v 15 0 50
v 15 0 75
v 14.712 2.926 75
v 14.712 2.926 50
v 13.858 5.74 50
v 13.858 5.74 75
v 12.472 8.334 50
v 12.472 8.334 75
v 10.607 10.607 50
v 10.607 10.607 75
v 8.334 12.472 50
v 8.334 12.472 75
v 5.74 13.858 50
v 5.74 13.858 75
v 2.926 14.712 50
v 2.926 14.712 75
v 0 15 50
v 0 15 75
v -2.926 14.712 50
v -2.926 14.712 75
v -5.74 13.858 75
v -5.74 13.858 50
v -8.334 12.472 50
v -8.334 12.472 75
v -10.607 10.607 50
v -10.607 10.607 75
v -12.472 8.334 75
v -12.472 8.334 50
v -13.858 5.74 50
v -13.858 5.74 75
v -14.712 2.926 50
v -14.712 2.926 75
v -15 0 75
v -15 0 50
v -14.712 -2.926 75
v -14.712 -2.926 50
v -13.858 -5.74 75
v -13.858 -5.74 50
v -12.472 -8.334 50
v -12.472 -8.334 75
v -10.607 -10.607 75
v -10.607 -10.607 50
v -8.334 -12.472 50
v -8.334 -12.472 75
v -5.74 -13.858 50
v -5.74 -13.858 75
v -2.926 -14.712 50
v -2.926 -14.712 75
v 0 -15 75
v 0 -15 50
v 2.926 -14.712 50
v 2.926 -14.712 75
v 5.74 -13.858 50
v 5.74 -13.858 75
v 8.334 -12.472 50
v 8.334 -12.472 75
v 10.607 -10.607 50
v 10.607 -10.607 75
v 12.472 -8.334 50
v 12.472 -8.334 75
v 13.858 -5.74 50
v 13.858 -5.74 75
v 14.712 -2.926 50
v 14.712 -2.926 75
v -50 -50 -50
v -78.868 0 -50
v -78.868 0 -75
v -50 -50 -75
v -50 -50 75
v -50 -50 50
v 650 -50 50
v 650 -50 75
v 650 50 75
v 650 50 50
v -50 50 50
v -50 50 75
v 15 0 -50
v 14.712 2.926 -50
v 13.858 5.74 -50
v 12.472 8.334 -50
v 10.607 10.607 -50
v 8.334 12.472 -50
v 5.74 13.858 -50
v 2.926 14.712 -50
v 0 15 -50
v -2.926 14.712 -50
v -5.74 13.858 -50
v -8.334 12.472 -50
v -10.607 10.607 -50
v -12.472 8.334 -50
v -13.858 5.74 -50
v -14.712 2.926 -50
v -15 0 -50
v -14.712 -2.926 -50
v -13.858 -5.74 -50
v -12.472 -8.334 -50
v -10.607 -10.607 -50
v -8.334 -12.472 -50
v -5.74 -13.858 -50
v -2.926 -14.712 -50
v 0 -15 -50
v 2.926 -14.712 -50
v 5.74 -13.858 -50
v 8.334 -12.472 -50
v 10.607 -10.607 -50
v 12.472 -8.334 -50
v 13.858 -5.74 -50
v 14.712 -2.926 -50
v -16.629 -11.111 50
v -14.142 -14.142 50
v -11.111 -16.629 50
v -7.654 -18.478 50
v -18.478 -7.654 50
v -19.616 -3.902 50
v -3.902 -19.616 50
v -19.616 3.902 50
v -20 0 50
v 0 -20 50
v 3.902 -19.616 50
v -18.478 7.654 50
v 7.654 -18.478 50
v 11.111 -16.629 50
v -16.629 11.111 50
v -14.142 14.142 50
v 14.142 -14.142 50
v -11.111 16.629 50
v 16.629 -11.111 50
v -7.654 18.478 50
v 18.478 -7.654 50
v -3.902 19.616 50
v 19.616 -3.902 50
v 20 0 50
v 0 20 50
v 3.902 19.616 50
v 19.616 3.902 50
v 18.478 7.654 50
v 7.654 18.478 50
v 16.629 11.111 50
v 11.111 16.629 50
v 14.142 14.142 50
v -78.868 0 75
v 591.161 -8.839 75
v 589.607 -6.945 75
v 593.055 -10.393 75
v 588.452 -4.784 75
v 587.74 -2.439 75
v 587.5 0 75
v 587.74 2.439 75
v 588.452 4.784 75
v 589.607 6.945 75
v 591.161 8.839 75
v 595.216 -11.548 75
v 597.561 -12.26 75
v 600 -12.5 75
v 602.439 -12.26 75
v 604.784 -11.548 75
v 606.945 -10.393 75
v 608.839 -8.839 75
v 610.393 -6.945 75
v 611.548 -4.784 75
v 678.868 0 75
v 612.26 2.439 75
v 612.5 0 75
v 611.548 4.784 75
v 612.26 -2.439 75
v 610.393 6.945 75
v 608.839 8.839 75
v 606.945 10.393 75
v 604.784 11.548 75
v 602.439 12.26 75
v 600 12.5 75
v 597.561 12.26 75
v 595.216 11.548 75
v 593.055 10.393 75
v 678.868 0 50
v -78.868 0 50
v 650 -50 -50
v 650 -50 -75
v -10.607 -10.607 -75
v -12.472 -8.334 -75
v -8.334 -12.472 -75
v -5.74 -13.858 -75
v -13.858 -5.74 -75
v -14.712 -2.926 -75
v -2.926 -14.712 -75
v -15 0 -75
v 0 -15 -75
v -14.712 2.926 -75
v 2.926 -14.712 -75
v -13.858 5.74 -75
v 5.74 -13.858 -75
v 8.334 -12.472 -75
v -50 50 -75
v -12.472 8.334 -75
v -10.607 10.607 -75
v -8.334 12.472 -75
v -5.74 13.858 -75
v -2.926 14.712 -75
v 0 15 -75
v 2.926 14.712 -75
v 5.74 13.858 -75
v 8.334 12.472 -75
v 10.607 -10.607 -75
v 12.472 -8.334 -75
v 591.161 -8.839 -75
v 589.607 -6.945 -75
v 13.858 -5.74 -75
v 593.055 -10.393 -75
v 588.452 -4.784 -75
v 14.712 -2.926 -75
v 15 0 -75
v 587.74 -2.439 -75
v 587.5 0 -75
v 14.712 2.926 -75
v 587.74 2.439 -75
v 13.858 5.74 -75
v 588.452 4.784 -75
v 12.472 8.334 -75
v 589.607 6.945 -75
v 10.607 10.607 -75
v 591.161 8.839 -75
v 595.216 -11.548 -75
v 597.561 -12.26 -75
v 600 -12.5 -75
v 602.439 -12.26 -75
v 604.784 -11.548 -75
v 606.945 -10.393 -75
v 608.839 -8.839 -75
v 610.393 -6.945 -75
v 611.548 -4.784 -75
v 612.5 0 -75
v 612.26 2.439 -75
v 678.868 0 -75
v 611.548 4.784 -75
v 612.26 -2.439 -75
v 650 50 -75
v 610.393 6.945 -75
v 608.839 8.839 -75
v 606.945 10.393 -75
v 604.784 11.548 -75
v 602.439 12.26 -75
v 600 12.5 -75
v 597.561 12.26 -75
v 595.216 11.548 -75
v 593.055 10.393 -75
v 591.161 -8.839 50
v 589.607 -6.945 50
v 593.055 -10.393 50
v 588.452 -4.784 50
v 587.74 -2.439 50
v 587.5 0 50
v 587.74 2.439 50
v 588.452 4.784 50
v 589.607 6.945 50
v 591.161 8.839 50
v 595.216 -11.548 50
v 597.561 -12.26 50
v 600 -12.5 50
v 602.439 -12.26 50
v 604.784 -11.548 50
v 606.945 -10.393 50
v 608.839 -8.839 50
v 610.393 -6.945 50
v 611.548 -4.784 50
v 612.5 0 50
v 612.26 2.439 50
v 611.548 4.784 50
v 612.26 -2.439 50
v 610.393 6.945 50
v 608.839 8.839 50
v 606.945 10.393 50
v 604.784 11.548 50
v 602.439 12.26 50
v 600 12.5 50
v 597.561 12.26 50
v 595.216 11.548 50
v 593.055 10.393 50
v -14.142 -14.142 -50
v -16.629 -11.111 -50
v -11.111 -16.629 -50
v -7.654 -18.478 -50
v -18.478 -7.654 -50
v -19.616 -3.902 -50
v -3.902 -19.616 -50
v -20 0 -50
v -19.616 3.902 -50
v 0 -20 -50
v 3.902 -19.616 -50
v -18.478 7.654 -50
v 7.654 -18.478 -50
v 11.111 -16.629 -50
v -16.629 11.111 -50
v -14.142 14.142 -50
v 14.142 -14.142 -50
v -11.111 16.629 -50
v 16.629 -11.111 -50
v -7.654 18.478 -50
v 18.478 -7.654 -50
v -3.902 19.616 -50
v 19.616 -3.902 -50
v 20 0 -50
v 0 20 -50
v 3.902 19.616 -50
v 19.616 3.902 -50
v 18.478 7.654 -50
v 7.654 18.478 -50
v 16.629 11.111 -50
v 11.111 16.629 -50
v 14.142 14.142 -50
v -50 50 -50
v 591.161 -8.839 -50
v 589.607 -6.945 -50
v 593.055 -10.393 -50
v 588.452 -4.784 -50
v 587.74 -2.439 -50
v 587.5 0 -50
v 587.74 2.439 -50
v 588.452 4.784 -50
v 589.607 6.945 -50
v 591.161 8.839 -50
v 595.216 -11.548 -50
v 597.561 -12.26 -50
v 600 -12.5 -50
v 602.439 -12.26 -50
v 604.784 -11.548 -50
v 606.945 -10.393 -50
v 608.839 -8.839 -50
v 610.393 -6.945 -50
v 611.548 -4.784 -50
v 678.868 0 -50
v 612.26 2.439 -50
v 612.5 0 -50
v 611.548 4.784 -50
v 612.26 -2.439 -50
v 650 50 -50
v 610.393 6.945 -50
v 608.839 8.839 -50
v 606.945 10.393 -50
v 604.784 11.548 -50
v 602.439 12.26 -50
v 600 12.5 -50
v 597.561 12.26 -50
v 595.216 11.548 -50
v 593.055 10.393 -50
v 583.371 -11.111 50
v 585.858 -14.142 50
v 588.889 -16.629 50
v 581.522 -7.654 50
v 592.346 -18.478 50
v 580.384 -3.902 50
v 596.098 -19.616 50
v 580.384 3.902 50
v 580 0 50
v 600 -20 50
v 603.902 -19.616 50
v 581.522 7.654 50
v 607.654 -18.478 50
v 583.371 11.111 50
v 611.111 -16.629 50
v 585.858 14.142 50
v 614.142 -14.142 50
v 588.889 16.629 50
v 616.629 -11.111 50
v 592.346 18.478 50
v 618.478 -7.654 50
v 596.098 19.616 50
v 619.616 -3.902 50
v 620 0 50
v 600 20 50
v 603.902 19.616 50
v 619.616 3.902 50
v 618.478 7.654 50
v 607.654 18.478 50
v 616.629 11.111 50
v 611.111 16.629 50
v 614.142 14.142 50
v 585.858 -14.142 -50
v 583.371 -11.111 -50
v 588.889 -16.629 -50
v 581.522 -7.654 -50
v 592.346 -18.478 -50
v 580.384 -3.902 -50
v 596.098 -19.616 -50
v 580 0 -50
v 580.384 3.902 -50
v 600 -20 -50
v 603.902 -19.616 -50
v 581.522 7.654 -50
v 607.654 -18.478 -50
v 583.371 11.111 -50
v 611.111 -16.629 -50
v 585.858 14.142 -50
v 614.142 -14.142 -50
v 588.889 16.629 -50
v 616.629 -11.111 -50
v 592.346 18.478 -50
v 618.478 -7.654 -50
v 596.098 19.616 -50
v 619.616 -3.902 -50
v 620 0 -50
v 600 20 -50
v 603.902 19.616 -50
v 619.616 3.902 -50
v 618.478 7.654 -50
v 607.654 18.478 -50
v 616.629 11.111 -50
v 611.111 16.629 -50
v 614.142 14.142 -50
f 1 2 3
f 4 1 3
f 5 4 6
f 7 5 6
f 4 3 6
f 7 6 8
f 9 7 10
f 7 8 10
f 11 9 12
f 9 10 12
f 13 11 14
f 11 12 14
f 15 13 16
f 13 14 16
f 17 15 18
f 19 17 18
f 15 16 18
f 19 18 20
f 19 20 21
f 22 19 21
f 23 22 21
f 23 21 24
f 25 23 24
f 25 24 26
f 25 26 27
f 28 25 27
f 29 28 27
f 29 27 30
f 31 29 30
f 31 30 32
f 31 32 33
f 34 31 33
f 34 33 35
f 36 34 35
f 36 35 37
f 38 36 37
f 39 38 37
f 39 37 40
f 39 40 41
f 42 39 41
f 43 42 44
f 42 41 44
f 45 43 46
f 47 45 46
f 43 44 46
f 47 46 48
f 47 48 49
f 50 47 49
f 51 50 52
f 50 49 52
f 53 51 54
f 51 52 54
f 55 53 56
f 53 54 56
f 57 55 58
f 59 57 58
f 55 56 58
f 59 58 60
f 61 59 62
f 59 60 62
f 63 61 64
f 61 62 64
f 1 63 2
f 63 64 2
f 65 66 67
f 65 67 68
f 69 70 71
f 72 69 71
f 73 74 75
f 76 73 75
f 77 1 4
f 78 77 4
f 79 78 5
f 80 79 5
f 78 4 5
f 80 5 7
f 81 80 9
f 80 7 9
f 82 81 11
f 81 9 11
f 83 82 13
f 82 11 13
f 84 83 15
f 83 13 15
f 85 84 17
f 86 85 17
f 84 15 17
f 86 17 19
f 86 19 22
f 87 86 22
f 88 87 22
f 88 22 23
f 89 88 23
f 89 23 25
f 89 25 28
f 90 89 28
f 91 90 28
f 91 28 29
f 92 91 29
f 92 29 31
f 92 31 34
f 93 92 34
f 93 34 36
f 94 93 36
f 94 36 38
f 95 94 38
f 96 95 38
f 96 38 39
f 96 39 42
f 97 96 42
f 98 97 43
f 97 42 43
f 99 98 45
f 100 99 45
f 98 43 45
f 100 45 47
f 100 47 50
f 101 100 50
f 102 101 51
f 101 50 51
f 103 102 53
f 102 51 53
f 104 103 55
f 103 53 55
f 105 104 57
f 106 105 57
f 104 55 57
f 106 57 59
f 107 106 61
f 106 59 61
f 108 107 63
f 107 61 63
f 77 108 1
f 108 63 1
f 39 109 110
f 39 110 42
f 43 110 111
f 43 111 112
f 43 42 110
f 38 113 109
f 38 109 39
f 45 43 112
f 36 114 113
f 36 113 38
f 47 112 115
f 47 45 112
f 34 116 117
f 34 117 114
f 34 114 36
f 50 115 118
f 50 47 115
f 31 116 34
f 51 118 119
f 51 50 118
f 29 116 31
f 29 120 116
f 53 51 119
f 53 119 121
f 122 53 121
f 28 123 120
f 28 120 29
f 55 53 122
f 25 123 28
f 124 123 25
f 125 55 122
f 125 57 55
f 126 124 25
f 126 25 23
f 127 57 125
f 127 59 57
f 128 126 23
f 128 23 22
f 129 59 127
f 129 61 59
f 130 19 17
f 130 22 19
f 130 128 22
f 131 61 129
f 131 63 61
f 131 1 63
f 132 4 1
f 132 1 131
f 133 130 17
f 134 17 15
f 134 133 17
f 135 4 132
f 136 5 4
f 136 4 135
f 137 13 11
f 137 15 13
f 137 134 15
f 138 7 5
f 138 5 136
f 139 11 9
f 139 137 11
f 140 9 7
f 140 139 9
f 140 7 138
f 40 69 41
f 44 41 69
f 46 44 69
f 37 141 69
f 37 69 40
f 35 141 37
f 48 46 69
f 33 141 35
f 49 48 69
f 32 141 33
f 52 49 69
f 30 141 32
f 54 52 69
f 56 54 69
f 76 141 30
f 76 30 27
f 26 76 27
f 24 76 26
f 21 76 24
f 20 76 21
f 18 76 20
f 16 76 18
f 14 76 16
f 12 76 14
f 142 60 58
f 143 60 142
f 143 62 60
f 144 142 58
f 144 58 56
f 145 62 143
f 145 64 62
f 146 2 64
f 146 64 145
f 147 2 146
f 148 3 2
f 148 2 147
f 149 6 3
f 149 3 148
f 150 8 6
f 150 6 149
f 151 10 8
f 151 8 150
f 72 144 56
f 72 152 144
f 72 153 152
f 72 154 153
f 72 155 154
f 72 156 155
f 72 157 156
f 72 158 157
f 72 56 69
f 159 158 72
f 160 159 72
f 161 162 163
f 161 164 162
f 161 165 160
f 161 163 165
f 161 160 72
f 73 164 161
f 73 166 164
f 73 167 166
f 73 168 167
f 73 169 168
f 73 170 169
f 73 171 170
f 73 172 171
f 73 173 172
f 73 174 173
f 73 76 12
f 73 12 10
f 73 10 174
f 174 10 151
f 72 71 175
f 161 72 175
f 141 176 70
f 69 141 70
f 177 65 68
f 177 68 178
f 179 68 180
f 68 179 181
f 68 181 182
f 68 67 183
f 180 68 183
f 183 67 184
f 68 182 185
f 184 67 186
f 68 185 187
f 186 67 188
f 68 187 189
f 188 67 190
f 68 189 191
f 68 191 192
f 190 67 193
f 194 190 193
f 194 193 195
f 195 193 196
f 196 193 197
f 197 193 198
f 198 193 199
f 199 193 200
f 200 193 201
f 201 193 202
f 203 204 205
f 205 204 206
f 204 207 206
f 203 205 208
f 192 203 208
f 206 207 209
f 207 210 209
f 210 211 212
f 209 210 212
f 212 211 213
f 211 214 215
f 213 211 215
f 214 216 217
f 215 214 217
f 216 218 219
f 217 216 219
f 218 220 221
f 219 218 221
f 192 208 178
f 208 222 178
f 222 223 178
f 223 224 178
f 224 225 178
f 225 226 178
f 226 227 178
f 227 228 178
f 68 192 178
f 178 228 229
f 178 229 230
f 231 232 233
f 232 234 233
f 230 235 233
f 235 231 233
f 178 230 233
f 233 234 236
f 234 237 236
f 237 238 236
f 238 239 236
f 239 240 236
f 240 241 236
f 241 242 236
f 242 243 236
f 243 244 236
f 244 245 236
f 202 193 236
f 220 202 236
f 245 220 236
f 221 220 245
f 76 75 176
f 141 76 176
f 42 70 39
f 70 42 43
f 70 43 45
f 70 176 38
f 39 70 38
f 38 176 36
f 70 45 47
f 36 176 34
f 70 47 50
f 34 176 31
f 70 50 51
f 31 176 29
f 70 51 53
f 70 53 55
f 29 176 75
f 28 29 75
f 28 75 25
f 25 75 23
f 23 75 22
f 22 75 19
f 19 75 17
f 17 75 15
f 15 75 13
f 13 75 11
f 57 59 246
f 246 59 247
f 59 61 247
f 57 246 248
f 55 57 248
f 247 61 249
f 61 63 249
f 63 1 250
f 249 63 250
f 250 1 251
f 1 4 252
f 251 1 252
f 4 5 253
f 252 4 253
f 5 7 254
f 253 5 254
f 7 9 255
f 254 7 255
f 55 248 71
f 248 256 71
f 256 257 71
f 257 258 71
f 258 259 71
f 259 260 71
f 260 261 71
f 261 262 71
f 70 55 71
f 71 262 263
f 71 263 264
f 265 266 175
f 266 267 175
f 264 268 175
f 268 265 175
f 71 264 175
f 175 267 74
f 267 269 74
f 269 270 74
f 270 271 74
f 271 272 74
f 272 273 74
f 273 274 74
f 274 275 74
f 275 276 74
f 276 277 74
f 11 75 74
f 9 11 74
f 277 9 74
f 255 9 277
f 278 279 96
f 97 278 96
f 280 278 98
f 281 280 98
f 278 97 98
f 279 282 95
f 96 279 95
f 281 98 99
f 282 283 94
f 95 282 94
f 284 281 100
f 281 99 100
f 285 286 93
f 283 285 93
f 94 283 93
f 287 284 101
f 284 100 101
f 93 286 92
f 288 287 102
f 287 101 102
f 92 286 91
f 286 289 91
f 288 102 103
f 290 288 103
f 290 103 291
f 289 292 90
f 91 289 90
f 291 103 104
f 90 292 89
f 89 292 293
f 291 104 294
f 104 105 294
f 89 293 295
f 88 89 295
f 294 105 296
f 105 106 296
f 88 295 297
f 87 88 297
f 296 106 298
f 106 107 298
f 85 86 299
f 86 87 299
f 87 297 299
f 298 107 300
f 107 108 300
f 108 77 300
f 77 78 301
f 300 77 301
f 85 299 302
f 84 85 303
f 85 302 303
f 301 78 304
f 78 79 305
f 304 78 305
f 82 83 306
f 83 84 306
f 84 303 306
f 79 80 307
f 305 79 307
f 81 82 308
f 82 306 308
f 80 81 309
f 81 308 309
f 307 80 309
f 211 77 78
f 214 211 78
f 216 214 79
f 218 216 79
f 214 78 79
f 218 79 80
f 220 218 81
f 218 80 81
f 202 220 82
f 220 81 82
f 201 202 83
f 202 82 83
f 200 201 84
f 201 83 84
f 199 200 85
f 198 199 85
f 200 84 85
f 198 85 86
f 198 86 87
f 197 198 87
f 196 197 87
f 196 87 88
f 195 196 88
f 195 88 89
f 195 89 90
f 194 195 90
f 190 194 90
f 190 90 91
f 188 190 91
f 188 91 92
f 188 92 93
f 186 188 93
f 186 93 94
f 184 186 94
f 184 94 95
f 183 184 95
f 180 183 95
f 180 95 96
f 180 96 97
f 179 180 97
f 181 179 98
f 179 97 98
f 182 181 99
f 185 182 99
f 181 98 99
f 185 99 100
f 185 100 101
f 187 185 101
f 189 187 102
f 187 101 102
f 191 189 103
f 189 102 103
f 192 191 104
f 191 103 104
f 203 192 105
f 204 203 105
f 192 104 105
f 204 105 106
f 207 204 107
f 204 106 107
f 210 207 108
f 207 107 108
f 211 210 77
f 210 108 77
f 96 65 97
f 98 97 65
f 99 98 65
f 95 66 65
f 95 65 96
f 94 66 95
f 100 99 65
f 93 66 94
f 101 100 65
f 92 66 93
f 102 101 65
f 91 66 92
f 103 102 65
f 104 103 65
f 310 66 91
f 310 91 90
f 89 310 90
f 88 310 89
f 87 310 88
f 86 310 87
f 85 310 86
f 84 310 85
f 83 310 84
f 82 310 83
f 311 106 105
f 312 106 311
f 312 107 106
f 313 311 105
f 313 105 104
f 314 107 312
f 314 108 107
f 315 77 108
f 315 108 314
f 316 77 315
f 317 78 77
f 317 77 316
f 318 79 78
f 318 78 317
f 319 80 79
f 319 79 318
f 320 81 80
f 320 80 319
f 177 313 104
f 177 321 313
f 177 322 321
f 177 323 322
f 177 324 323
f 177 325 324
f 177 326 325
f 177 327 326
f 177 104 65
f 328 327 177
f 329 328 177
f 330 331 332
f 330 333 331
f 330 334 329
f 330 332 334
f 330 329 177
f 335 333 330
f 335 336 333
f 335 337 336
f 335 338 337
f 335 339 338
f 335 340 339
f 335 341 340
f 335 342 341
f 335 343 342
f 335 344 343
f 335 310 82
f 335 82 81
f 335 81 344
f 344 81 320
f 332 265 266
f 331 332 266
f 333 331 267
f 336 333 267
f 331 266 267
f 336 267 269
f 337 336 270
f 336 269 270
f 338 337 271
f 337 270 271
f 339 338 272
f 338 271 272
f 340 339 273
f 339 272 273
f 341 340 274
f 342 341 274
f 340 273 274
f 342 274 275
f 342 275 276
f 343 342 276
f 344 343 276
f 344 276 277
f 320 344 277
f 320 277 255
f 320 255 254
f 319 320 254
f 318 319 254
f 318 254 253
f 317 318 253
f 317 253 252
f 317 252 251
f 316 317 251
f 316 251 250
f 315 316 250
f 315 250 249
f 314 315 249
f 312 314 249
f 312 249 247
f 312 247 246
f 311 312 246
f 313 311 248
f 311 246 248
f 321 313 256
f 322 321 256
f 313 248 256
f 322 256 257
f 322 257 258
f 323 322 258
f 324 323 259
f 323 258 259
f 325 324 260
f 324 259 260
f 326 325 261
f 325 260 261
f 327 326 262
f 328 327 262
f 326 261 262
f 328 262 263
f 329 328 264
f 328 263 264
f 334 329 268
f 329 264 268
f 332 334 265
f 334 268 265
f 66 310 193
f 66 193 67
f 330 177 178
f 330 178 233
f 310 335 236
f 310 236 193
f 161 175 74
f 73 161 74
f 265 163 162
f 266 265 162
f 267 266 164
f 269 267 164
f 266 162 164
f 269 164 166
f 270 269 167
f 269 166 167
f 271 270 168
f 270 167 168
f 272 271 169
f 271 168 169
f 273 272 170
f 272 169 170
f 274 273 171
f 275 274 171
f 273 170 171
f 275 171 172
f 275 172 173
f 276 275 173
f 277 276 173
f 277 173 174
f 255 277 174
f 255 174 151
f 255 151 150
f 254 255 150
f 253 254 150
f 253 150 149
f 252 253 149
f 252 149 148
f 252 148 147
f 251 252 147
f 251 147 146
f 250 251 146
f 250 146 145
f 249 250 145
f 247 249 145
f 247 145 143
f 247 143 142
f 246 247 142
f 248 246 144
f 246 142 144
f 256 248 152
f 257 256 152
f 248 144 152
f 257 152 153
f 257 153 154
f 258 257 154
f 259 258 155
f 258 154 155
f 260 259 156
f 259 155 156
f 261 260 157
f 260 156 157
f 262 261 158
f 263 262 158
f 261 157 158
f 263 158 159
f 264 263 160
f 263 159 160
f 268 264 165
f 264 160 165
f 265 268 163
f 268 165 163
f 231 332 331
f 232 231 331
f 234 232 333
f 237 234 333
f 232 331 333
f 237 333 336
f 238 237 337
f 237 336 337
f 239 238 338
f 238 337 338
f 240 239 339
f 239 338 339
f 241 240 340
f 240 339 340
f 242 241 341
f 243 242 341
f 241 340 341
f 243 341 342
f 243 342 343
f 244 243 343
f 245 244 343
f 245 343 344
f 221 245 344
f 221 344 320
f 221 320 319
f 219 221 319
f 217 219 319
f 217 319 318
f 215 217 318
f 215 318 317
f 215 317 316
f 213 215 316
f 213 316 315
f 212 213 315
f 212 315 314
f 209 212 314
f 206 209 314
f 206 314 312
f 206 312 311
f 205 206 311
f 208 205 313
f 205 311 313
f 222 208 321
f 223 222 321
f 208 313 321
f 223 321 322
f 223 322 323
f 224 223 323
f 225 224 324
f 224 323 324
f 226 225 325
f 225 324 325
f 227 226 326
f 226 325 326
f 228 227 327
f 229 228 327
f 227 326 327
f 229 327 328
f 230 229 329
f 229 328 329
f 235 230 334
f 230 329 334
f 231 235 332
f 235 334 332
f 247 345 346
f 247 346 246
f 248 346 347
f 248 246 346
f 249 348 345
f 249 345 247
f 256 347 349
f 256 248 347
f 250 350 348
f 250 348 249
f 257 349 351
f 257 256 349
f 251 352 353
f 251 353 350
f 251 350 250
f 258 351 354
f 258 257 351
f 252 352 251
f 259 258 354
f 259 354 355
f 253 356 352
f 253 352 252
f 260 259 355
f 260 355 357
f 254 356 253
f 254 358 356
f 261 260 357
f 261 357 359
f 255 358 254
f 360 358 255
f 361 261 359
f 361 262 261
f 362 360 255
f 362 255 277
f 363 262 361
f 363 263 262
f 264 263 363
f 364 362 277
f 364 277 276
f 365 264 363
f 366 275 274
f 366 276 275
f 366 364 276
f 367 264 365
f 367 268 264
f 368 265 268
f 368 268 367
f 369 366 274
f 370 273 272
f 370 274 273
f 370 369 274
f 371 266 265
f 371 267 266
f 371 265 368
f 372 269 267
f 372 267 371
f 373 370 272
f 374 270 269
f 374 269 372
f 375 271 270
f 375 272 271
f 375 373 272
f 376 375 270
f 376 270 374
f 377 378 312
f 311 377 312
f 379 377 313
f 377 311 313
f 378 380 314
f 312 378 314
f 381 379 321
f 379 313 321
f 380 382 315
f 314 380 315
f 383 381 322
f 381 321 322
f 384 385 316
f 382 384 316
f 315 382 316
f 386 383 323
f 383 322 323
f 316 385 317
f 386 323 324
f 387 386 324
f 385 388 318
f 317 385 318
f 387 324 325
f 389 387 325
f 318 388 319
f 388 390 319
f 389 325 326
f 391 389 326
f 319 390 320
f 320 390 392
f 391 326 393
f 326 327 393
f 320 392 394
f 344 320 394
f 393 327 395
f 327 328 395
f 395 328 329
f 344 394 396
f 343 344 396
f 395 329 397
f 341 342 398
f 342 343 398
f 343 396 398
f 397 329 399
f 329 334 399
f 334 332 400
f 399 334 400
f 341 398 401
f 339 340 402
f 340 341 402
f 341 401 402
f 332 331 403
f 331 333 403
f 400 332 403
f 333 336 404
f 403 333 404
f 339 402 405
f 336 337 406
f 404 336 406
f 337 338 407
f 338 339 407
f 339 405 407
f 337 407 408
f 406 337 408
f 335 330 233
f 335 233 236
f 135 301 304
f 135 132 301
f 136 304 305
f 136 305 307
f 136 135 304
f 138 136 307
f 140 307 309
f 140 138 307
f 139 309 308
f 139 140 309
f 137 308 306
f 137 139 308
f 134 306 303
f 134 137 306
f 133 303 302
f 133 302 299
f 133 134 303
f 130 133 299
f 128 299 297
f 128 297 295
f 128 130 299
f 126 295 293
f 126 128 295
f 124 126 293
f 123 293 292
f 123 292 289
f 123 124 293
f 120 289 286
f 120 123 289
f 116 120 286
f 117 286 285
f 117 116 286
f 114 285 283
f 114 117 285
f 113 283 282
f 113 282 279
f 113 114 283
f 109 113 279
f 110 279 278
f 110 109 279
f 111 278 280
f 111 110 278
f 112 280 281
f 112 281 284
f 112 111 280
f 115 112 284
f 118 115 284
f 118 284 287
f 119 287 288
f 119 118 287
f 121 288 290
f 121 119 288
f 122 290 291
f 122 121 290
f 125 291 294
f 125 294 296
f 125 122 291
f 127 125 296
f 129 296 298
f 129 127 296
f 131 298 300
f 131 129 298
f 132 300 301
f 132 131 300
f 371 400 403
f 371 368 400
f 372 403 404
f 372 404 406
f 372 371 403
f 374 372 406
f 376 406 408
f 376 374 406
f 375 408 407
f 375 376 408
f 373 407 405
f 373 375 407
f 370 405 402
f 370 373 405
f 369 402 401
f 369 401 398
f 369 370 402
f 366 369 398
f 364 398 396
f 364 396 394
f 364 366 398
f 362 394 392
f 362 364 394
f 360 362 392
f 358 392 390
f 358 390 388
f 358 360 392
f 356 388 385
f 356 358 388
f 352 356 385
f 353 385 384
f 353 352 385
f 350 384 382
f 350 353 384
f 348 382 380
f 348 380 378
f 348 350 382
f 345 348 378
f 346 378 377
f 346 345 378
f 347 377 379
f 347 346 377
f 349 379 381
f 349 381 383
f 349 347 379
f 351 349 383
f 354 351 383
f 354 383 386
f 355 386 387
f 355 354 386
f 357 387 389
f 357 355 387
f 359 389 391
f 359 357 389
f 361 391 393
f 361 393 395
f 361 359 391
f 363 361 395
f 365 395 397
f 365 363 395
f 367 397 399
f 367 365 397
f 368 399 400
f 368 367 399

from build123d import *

# Parameters (mm, degrees)
SKETCH1_R             = 20
BOSS_EXTRUDE1_DEPTH   = 50
BOSS_EXTRUDE1_2_DEPTH = 50
BOSS_EXTRUDE2_DEPTH   = 25
SKETCH3_R             = 15
CUT_EXTRUDE1_DEPTH    = 698.037374056
SKETCH4_R             = 12.5
CUT_EXTRUDE2_DEPTH    = 698.037374056


with BuildPart() as part:
    # Sketch1 → Boss-Extrude1 (new, symmetric)
    with BuildSketch(Plane.XY):
        Circle(SKETCH1_R)
    extrude(amount=BOSS_EXTRUDE1_DEPTH, both=True)


with BuildPart() as body_2:
    # Sketch1 → Boss-Extrude1 2 (new, symmetric)
    with BuildSketch(Plane.XY):
        with Locations((600, 0)):
            Circle(SKETCH1_R)
    extrude(amount=BOSS_EXTRUDE1_2_DEPTH, both=True)


with BuildPart() as body_3:
    # Sketch2 → Boss-Extrude2 (new body)
    with BuildSketch(Plane.XY.offset(50)):
        Polygon((-50, 50), (-78.867513459, 0), (-50, -50), (650, -50), (678.867513459, 0), (650, 50), align=None)
    extrude(amount=BOSS_EXTRUDE2_DEPTH)


with BuildPart() as body_4:
    # Mirror1: mirrored copy
    add(body_3.part.mirror(Plane.XY))


with BuildPart() as cut_extrude1_tool:
    # Sketch3 → Cut-Extrude1 (new, through all)
    with BuildSketch(Plane.XY.offset(75)):
        Circle(SKETCH3_R)
        with Locations((700, 0)):
            Circle(SKETCH3_R)
    extrude(amount=-CUT_EXTRUDE1_DEPTH)


with BuildPart() as part_1:
    add(part.part)

    # Cut-Extrude1: cut by cut_extrude1_tool
    add(cut_extrude1_tool.part, mode=Mode.SUBTRACT)


with BuildPart() as body_3_1:
    add(body_3.part)

    # Cut-Extrude1: cut by cut_extrude1_tool
    add(cut_extrude1_tool.part, mode=Mode.SUBTRACT)


with BuildPart() as body_4_1:
    add(body_4.part)

    # Cut-Extrude1: cut by cut_extrude1_tool
    add(cut_extrude1_tool.part, mode=Mode.SUBTRACT)


with BuildPart() as cut_extrude2_tool:
    # Sketch4 → Cut-Extrude2 (new, through all)
    with BuildSketch(Plane.XY.offset(75)):
        with Locations((600, 0)):
            Circle(SKETCH4_R)
    extrude(amount=-CUT_EXTRUDE2_DEPTH)


with BuildPart() as body_2_1:
    add(body_2.part)

    # Cut-Extrude2: cut by cut_extrude2_tool
    add(cut_extrude2_tool.part, mode=Mode.SUBTRACT)


with BuildPart() as body_3_2:
    add(body_3_1.part)

    # Cut-Extrude2: cut by cut_extrude2_tool
    add(cut_extrude2_tool.part, mode=Mode.SUBTRACT)


with BuildPart() as body_4_2:
    add(body_4_1.part)

    # Cut-Extrude2: cut by cut_extrude2_tool
    add(cut_extrude2_tool.part, mode=Mode.SUBTRACT)


solid = Compound([part_1.part, body_2_1.part, body_3_2.part, body_4_2.part])
